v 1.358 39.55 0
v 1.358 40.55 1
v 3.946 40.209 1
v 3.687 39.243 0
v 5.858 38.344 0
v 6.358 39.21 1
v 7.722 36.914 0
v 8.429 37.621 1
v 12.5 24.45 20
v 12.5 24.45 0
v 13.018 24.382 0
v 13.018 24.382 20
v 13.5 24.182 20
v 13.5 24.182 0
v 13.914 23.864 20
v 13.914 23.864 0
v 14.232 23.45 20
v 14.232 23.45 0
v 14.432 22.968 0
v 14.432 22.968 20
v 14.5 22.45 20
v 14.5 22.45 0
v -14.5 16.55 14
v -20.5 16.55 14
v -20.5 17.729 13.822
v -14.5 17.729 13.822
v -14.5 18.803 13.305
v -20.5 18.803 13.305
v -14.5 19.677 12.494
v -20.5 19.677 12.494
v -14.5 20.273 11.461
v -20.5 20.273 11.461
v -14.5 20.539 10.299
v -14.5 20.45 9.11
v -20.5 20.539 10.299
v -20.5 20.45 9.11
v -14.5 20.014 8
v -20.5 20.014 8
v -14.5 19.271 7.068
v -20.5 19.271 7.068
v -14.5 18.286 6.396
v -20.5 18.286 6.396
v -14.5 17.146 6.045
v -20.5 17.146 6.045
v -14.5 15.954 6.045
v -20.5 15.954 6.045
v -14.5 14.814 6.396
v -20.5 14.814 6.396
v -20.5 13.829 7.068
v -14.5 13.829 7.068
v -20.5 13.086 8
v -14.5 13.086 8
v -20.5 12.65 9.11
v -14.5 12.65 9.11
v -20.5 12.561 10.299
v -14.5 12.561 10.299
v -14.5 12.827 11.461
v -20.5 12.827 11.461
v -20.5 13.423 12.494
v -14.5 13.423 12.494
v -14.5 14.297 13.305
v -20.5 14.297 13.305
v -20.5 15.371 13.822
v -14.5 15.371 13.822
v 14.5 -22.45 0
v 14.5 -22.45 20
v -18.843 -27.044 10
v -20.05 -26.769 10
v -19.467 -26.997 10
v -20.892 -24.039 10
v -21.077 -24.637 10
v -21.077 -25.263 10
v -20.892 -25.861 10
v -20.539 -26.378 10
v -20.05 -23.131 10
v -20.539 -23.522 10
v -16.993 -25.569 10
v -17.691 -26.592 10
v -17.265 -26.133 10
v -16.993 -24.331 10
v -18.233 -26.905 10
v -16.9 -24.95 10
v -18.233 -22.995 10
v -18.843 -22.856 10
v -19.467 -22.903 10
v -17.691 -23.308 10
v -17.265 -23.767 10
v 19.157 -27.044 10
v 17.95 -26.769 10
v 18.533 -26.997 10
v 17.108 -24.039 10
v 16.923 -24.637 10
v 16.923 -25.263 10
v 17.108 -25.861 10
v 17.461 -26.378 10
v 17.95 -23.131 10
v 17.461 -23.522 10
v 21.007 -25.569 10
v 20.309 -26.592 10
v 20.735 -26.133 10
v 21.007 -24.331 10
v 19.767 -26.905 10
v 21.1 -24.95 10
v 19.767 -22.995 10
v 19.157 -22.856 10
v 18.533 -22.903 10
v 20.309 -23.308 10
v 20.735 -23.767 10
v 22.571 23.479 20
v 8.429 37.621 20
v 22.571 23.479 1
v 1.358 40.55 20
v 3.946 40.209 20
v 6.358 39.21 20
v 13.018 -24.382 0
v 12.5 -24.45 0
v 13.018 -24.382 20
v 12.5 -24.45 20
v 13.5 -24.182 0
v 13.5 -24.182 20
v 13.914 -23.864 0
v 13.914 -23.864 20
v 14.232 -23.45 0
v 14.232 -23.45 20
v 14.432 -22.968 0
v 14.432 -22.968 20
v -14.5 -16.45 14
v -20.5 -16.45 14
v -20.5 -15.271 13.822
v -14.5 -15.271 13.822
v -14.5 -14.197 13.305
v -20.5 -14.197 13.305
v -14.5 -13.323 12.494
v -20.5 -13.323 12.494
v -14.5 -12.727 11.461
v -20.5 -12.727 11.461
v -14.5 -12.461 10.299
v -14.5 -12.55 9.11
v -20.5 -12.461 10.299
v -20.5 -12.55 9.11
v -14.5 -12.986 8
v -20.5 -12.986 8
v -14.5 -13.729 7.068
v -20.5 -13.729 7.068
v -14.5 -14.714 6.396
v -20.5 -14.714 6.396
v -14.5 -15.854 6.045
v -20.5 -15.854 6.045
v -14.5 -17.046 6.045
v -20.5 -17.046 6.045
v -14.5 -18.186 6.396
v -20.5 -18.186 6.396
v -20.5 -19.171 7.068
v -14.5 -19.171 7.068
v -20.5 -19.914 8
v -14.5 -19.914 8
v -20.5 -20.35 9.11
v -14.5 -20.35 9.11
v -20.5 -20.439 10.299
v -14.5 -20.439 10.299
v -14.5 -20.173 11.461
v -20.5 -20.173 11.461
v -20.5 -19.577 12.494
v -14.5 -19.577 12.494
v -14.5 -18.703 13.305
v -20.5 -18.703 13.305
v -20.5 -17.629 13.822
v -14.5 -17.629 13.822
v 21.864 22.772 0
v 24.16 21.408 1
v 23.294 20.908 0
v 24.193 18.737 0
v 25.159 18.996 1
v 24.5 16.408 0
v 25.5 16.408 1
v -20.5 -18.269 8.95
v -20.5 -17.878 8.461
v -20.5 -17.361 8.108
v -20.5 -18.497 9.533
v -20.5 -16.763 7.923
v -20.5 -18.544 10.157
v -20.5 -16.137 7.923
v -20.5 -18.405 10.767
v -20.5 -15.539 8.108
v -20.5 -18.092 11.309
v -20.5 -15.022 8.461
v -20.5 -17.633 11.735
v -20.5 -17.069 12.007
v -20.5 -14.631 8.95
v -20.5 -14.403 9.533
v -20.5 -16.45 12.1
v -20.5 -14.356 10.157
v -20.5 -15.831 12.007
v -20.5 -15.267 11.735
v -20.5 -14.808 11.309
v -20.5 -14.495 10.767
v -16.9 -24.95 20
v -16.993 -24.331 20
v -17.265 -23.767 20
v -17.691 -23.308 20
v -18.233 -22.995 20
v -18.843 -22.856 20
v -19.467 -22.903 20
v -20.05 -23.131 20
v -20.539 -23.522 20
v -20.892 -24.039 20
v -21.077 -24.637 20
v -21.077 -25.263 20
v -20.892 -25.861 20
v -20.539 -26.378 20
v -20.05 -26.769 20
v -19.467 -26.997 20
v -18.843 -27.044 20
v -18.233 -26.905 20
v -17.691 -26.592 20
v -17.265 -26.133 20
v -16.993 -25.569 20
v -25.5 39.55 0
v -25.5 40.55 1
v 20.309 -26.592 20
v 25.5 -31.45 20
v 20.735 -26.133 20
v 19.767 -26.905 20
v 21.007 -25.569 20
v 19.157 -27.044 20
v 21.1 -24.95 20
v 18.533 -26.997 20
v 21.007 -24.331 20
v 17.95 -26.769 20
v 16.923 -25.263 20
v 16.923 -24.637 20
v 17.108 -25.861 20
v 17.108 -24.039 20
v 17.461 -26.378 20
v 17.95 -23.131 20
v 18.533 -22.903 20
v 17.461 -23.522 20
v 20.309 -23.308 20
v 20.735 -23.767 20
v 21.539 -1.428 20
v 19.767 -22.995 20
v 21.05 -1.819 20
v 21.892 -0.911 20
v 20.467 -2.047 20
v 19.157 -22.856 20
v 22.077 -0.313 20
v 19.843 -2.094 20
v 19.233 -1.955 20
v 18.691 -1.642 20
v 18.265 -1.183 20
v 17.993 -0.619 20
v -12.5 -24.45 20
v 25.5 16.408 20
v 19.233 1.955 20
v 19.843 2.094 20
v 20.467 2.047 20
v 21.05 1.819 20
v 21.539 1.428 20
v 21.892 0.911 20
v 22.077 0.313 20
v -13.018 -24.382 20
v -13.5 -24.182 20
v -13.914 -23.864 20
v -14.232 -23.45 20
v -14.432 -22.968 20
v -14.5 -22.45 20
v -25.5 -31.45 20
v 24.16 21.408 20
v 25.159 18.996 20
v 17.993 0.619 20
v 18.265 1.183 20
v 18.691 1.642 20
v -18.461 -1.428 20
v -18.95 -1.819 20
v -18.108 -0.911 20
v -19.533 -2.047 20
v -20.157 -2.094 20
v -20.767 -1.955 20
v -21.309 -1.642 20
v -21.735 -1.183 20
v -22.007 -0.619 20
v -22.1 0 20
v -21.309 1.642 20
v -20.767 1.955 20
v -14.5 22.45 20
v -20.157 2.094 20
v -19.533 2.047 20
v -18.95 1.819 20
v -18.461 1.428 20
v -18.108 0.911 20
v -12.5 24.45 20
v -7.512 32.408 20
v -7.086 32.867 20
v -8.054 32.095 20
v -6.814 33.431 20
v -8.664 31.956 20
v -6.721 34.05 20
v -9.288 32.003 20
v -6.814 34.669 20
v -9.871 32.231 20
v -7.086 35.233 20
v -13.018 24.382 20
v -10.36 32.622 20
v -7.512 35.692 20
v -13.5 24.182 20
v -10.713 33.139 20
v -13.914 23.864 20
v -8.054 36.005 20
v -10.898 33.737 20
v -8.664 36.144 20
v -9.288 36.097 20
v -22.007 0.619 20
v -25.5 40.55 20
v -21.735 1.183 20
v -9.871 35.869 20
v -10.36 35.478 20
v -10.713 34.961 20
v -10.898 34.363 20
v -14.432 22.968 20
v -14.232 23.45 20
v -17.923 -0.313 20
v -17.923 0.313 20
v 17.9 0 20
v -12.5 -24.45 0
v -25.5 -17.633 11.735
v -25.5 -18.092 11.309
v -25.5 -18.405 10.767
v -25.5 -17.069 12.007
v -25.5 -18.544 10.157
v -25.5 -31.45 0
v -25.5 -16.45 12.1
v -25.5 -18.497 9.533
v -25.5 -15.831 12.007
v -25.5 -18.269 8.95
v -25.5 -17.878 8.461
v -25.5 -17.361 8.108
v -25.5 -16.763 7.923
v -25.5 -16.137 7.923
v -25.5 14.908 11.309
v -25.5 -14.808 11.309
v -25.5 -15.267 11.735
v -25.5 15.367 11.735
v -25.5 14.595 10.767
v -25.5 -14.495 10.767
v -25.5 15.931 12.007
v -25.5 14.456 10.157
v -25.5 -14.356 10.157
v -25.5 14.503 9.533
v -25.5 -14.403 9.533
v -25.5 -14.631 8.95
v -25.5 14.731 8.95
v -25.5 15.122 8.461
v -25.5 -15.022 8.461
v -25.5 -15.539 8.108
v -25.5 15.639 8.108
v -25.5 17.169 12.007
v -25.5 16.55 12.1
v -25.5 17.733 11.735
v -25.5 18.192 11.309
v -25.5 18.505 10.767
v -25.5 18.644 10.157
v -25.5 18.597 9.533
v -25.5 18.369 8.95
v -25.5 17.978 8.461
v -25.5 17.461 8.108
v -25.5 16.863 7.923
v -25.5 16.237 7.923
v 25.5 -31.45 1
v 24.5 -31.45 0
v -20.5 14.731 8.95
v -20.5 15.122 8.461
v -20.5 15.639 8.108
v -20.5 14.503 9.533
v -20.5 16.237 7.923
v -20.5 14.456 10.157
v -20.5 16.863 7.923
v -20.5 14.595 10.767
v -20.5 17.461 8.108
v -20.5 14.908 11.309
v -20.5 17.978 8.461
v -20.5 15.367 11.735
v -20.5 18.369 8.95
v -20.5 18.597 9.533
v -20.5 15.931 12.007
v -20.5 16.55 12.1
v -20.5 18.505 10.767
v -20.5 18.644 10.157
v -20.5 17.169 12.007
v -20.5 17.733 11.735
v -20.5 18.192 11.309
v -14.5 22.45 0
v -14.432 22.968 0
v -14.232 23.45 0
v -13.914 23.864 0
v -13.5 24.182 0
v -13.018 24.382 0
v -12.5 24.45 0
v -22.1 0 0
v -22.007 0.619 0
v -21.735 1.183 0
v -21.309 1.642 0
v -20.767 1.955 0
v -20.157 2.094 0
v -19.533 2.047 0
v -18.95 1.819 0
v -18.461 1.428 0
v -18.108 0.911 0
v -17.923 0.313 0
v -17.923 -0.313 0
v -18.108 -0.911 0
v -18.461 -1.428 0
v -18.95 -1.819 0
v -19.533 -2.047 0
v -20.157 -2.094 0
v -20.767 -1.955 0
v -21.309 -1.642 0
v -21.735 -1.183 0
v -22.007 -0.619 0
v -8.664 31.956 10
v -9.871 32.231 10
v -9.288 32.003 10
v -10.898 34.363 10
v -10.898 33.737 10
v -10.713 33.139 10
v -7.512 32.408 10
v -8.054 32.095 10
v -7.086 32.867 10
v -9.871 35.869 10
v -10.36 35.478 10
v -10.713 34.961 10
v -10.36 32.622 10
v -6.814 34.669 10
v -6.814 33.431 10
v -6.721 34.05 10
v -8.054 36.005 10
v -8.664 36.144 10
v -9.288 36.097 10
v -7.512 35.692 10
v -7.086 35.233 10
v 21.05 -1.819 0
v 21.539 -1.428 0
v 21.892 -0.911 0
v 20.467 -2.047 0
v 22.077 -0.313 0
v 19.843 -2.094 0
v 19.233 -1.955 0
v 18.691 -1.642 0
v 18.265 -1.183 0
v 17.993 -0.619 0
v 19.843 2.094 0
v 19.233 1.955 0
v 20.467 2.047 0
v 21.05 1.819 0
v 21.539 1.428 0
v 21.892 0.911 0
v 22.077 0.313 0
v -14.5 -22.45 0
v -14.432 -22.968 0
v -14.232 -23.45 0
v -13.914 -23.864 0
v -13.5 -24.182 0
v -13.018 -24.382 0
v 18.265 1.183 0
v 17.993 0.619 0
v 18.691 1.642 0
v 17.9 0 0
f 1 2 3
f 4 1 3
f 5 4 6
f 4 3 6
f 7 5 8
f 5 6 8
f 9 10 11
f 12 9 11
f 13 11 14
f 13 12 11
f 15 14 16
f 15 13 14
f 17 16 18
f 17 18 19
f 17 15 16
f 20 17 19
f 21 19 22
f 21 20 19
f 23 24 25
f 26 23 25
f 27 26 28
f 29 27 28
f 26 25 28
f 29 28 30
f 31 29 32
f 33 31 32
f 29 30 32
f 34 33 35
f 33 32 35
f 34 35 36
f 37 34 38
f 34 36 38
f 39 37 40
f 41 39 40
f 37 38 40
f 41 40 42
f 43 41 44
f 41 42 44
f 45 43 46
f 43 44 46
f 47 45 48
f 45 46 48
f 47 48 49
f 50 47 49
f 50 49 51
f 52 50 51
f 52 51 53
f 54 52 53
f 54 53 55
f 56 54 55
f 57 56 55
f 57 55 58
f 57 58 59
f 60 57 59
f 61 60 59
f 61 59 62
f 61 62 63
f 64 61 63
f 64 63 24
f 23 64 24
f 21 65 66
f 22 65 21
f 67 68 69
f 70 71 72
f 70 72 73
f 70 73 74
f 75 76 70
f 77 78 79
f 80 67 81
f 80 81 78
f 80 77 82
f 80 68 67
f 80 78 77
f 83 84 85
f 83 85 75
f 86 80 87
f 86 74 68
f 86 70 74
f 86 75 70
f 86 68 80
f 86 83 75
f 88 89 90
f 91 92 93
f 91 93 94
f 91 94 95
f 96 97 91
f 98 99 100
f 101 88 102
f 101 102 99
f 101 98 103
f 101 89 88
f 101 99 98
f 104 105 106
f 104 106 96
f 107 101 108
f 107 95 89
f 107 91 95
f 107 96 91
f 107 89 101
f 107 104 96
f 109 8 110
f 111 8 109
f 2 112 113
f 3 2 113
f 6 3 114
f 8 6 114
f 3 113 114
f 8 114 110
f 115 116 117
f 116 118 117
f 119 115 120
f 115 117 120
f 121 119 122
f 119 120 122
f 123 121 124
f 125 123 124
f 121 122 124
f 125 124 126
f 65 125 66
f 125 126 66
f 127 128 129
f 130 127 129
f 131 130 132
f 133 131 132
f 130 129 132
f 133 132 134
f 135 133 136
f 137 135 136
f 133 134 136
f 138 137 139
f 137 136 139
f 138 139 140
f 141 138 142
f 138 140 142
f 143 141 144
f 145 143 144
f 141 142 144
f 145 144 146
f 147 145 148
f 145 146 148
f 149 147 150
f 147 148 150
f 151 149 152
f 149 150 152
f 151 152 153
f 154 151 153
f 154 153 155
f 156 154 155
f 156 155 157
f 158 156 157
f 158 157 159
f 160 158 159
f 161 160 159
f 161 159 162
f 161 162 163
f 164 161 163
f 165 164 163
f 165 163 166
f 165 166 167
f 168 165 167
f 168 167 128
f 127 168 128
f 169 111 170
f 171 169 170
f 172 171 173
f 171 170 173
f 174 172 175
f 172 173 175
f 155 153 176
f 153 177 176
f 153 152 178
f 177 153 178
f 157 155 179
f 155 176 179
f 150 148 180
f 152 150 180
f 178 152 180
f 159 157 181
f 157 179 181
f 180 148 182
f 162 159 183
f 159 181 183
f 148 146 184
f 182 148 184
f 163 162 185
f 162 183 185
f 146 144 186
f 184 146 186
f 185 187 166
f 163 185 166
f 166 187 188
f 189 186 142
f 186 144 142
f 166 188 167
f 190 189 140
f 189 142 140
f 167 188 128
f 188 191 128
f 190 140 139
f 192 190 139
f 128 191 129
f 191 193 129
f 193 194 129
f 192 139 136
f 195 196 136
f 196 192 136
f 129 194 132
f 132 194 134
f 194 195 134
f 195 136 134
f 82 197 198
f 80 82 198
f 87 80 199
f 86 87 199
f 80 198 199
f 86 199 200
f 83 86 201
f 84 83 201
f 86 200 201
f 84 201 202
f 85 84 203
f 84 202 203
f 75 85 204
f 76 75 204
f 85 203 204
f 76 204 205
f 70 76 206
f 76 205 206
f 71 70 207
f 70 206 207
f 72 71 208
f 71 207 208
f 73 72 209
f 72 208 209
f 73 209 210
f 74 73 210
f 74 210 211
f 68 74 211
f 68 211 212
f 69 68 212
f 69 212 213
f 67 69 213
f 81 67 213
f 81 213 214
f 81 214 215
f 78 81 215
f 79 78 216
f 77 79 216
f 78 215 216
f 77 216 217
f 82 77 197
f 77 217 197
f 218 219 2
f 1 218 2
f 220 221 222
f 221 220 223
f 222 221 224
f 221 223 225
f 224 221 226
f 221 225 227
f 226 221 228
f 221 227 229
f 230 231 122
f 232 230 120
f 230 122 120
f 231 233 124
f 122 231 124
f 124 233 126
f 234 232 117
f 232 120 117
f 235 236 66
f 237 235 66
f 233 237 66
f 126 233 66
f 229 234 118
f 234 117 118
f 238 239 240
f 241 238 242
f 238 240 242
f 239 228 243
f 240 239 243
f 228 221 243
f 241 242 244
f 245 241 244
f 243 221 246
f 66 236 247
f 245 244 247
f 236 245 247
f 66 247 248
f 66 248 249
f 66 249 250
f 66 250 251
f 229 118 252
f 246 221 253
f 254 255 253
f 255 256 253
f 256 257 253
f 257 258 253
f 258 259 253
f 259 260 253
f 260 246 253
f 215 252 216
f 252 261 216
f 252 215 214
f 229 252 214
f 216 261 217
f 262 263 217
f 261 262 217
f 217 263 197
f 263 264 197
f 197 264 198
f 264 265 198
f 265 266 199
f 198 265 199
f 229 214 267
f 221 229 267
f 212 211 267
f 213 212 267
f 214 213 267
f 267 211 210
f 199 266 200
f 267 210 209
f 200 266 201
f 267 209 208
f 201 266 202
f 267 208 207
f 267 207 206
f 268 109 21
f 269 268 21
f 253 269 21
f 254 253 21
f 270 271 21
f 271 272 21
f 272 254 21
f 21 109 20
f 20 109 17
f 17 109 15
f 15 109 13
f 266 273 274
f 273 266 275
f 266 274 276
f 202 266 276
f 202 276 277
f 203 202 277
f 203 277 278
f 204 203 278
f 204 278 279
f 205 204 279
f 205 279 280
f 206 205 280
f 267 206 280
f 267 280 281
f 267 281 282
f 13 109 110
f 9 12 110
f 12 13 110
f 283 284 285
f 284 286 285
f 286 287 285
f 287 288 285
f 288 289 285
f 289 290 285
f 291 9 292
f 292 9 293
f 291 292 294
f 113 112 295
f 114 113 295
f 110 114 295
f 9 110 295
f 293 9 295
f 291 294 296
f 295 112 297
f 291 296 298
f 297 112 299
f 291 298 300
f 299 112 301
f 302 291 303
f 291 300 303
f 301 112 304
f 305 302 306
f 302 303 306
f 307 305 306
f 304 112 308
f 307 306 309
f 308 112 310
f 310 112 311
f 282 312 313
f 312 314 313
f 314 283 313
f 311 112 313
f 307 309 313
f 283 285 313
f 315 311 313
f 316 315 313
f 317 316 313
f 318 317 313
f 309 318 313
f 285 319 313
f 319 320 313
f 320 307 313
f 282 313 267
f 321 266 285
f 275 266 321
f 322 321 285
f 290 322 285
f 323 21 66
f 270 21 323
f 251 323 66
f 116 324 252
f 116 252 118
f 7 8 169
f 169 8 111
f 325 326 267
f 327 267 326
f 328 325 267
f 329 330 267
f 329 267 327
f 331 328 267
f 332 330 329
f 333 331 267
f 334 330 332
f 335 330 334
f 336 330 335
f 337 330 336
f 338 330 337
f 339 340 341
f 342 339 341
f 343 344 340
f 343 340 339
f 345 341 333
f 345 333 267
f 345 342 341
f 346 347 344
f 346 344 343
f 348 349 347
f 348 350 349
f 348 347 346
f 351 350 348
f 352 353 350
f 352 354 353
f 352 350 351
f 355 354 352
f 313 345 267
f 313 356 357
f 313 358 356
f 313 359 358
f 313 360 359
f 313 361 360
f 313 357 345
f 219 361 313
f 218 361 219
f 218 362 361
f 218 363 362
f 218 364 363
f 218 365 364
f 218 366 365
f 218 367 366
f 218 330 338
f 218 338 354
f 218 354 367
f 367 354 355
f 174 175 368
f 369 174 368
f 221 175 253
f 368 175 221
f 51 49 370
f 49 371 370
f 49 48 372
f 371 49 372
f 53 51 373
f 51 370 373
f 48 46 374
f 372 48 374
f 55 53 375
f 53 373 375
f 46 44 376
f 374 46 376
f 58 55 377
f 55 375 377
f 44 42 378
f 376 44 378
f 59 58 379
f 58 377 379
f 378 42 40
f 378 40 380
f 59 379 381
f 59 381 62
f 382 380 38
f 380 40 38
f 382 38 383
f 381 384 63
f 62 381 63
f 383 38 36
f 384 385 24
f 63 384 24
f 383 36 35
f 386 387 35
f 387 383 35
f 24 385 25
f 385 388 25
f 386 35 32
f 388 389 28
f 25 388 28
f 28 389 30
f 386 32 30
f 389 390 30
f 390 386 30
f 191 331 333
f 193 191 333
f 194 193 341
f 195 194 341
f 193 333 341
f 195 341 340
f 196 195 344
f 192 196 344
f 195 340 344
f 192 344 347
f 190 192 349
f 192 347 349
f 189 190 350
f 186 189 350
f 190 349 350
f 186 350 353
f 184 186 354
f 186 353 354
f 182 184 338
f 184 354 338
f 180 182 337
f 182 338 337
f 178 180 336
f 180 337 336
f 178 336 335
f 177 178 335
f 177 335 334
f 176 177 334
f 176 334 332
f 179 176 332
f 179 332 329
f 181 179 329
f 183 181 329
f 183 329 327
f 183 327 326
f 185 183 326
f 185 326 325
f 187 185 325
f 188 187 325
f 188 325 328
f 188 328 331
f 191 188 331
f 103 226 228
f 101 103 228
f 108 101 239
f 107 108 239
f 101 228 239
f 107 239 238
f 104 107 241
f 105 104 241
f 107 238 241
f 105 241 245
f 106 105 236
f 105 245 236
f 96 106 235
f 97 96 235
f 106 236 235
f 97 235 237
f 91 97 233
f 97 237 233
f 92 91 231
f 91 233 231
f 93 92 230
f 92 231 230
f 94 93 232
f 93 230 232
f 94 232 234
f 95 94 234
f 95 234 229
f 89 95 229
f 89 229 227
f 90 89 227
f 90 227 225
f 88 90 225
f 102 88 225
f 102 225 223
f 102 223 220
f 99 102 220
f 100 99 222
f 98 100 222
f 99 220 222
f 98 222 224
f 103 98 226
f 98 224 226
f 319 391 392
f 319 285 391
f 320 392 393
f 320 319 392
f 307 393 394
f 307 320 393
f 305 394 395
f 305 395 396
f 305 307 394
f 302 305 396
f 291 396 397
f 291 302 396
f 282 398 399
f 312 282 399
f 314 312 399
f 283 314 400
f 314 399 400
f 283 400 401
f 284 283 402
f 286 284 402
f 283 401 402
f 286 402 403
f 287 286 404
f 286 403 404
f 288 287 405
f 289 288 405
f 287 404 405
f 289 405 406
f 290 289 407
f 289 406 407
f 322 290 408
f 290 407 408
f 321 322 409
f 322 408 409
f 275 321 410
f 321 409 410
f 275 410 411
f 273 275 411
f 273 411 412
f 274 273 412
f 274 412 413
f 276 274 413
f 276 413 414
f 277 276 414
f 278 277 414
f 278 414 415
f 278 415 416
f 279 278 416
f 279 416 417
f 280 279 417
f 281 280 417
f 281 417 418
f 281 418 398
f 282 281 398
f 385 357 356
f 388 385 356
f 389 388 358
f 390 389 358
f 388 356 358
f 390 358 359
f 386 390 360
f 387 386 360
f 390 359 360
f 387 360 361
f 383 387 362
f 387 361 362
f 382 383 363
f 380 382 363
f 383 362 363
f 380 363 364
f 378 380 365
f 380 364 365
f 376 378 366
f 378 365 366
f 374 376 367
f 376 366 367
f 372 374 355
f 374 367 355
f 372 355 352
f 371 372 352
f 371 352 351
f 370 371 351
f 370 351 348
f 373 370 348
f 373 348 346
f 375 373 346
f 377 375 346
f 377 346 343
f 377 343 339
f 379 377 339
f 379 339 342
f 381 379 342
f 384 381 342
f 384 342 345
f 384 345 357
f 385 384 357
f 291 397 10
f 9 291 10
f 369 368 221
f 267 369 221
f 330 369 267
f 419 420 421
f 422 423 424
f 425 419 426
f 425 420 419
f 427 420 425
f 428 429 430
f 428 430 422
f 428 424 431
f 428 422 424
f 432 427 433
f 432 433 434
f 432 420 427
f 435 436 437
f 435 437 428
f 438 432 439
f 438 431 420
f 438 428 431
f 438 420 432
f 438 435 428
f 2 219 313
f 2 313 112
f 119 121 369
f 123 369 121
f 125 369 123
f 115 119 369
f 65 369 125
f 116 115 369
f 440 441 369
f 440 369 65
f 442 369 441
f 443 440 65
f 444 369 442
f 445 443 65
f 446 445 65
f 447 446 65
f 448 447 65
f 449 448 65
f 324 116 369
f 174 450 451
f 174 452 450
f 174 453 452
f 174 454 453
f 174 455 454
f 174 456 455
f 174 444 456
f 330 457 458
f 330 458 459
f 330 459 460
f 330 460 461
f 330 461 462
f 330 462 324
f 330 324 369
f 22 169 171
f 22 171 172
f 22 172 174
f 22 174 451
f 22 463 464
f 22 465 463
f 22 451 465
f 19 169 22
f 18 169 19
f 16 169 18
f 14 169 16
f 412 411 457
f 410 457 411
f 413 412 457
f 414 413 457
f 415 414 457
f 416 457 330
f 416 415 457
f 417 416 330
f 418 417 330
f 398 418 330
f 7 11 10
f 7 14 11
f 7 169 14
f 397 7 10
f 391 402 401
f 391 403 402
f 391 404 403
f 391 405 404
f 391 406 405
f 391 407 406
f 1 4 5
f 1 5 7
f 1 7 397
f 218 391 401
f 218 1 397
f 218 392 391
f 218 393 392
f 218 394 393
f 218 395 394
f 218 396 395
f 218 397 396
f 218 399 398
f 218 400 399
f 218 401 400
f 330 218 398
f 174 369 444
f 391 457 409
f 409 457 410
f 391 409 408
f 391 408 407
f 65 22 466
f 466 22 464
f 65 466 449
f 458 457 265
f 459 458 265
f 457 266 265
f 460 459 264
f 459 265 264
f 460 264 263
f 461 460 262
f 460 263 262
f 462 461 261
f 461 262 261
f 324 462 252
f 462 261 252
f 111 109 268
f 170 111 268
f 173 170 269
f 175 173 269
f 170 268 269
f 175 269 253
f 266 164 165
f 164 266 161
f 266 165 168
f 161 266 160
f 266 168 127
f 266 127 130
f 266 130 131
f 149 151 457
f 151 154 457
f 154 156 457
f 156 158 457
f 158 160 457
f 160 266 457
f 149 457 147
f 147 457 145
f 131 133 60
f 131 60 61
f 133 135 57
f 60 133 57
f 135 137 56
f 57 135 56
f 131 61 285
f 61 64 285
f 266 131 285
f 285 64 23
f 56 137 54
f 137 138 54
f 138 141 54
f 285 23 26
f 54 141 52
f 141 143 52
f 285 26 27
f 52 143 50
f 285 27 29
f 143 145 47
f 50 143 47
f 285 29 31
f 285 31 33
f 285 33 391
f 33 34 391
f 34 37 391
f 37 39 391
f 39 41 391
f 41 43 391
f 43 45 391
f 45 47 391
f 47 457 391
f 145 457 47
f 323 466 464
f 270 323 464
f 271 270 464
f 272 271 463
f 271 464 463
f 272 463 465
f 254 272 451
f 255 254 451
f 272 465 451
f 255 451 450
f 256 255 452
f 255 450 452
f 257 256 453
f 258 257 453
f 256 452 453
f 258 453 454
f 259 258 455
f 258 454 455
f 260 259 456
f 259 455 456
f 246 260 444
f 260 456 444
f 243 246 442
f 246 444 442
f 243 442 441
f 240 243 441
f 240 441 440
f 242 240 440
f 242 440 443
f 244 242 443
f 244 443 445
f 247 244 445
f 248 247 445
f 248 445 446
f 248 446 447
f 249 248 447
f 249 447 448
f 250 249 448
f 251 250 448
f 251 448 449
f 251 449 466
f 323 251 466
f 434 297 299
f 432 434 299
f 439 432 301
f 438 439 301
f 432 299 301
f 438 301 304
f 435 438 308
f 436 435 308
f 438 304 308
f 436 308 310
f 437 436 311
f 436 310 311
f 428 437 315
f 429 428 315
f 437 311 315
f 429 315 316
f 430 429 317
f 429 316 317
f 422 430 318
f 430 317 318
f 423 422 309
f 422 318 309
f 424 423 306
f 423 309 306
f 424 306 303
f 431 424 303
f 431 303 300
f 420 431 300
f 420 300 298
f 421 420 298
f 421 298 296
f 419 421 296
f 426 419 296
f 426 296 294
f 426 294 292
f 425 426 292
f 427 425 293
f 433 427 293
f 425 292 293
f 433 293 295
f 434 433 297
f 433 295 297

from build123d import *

# Parameters (mm, degrees)
SKETCH1_W           = 29
SKETCH1_H           = 48.9
BOSS_EXTRUDE1_DEPTH = 20
SKETCH2_R           = 2.1
CUT_EXTRUDE1_DEPTH  = 52.909079167
FILLET1_R           = 2
FILLET2_R           = 10
CHAMFER1_SIZE       = 1
CUT_EXTRUDE2_REACH  = 70.156
SKETCH3_R           = 2.1
CUT_EXTRUDE3_REACH  = 66.5
SKETCH4_R           = 4
SKETCH5_R           = 2.1
CUT_EXTRUDE4_DEPTH  = 10


with BuildPart() as part:
    # Sketch1 → Boss-Extrude1 (new body)
    with BuildSketch(Plane.XY):
        Polygon((-25.5, 40.55), (5.5, 40.55), (25.5, 20.55), (25.5, -31.45), (-25.5, -31.45), align=None)
        Rectangle(SKETCH1_W, SKETCH1_H, mode=Mode.SUBTRACT)
    extrude(amount=BOSS_EXTRUDE1_DEPTH)

    # Sketch2 → Cut-Extrude1 (cut, through all)
    with BuildSketch(Plane(origin=(0, 0, 0), x_dir=(-1, 0, 0), z_dir=(0, 0, -1))):
        with Locations((-20, 0)):
            Circle(SKETCH2_R)
        with Locations((20, 0)):
            Circle(SKETCH2_R)
    extrude(amount=-CUT_EXTRUDE1_DEPTH, mode=Mode.SUBTRACT)

    # Fillet1
    fillet1_edges = [part.edges().sort_by_distance(p)[0] for p in [
        (14.5, -24.45, 10),
        (14.5, 24.45, 10),
        (-14.5, 24.45, 10),
        (-14.5, -24.45, 10),
    ]]
    fillet(fillet1_edges, radius=FILLET1_R)

    # Fillet2
    fillet2_edges = [part.edges().sort_by_distance(p)[0] for p in [
        (5.5, 40.55, 10),
        (25.5, 20.55, 10),
    ]]
    fillet(fillet2_edges, radius=FILLET2_R)

    # Chamfer1
    chamfer1_edges = [part.edges().sort_by_distance(p)[0] for p in [
        (25.5, -7.521067812, 0),
        (15.5, 30.55, 0),
        (-12.071067812, 40.55, 0),
        (5.1846987, 39.788795325, 0),
        (24.738795325, 20.2346987, 0),
    ]]
    chamfer(chamfer1_edges, length=CHAMFER1_SIZE)

    # Sketch3 → Cut-Extrude2 (cut, up to next)
    with BuildSketch(Plane.ZY.offset(25.5), mode=Mode.PRIVATE) as cut_extrude2_sk1:
        with Locations((10, 16.55)):
            Circle(SKETCH3_R)
    cut_extrude2_tool1 = extrude(cut_extrude2_sk1.sketch, amount=-CUT_EXTRUDE2_REACH, mode=Mode.PRIVATE) & part.part
    # Sketch3 → Cut-Extrude2 (cut, up to next)
    with BuildSketch(Plane.ZY.offset(25.5), mode=Mode.PRIVATE) as cut_extrude2_sk2:
        with Locations((10, -16.45)):
            Circle(SKETCH3_R)
    cut_extrude2_tool2 = extrude(cut_extrude2_sk2.sketch, amount=-CUT_EXTRUDE2_REACH, mode=Mode.PRIVATE) & part.part
    add(cut_extrude2_tool1.solids().sort_by_distance((-25.5, 16.55, 10))[0], mode=Mode.SUBTRACT)
    add(cut_extrude2_tool2.solids().sort_by_distance((-25.5, -16.45, 10))[0], mode=Mode.SUBTRACT)

    # Sketch4 → Cut-Extrude3 (cut, up to next)
    with BuildSketch(Plane.ZY.offset(20.5), mode=Mode.PRIVATE) as cut_extrude3_sk1:
        with Locations((10, 16.55)):
            Circle(SKETCH4_R)
    cut_extrude3_tool1 = extrude(cut_extrude3_sk1.sketch, amount=-CUT_EXTRUDE3_REACH, mode=Mode.PRIVATE) & part.part
    # Sketch4 → Cut-Extrude3 (cut, up to next)
    with BuildSketch(Plane.ZY.offset(20.5), mode=Mode.PRIVATE) as cut_extrude3_sk2:
        with Locations((10, -16.45)):
            Circle(SKETCH4_R)
    cut_extrude3_tool2 = extrude(cut_extrude3_sk2.sketch, amount=-CUT_EXTRUDE3_REACH, mode=Mode.PRIVATE) & part.part
    add(cut_extrude3_tool1.solids().sort_by_distance((-20.5, 16.55, 10))[0], mode=Mode.SUBTRACT)
    add(cut_extrude3_tool2.solids().sort_by_distance((-20.5, -16.45, 10))[0], mode=Mode.SUBTRACT)

    # Sketch5 → Cut-Extrude4 (cut)
    with BuildSketch(Plane.XY.offset(20)):
        with Locations((19, -24.95)):
            Circle(SKETCH5_R)
        with Locations((-8.821067812, 34.05)):
            Circle(SKETCH5_R)
        with Locations((-19, -24.95)):
            Circle(SKETCH5_R)
    extrude(amount=-CUT_EXTRUDE4_DEPTH, mode=Mode.SUBTRACT)


solid = part.part
